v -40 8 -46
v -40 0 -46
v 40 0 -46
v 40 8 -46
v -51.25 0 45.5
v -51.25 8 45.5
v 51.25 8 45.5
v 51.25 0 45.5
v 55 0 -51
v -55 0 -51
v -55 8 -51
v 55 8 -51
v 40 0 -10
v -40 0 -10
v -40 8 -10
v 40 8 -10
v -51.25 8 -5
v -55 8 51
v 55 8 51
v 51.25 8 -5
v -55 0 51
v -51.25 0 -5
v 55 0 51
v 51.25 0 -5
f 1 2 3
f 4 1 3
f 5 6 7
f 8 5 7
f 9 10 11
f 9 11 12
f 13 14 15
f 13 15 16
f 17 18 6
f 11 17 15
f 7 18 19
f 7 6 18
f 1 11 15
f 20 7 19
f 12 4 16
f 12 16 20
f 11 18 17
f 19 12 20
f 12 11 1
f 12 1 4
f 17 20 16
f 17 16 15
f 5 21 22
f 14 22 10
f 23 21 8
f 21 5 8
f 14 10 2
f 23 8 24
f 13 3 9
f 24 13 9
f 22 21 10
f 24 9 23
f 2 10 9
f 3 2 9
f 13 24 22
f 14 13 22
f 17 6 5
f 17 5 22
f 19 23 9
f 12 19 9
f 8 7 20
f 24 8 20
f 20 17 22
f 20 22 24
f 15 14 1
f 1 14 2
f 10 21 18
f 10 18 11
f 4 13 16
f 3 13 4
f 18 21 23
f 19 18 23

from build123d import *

# Parameters (mm, degrees)
SKETCH1_W           = 110
SKETCH1_H           = 102
SKETCH1_W_2         = 80
SKETCH1_H_2         = 36
BOSS_EXTRUDE1_DEPTH = 8
SKETCH2_W           = 102.5
SKETCH2_H           = 50.5
CUT_EXTRUDE1_DEPTH  = 8


with BuildPart() as part:
    # Sketch1 → Boss-Extrude1 (new body)
    with BuildSketch(Plane(origin=(0, 0, 0), x_dir=(1, 0, 0), z_dir=(0, 1, 0))):
        Rectangle(SKETCH1_W, SKETCH1_H)
        with Locations((0, 28)):
            Rectangle(SKETCH1_W_2, SKETCH1_H_2, mode=Mode.SUBTRACT)
    extrude(amount=BOSS_EXTRUDE1_DEPTH)

    # Sketch2 → Cut-Extrude1 (cut)
    with BuildSketch(Plane(origin=(0, 8, 0), x_dir=(1, 0, 0), z_dir=(0, 1, 0))):
        with Locations((0, -20.25)):
            Rectangle(SKETCH2_W, SKETCH2_H)
    extrude(amount=-CUT_EXTRUDE1_DEPTH, mode=Mode.SUBTRACT)


solid = part.part
